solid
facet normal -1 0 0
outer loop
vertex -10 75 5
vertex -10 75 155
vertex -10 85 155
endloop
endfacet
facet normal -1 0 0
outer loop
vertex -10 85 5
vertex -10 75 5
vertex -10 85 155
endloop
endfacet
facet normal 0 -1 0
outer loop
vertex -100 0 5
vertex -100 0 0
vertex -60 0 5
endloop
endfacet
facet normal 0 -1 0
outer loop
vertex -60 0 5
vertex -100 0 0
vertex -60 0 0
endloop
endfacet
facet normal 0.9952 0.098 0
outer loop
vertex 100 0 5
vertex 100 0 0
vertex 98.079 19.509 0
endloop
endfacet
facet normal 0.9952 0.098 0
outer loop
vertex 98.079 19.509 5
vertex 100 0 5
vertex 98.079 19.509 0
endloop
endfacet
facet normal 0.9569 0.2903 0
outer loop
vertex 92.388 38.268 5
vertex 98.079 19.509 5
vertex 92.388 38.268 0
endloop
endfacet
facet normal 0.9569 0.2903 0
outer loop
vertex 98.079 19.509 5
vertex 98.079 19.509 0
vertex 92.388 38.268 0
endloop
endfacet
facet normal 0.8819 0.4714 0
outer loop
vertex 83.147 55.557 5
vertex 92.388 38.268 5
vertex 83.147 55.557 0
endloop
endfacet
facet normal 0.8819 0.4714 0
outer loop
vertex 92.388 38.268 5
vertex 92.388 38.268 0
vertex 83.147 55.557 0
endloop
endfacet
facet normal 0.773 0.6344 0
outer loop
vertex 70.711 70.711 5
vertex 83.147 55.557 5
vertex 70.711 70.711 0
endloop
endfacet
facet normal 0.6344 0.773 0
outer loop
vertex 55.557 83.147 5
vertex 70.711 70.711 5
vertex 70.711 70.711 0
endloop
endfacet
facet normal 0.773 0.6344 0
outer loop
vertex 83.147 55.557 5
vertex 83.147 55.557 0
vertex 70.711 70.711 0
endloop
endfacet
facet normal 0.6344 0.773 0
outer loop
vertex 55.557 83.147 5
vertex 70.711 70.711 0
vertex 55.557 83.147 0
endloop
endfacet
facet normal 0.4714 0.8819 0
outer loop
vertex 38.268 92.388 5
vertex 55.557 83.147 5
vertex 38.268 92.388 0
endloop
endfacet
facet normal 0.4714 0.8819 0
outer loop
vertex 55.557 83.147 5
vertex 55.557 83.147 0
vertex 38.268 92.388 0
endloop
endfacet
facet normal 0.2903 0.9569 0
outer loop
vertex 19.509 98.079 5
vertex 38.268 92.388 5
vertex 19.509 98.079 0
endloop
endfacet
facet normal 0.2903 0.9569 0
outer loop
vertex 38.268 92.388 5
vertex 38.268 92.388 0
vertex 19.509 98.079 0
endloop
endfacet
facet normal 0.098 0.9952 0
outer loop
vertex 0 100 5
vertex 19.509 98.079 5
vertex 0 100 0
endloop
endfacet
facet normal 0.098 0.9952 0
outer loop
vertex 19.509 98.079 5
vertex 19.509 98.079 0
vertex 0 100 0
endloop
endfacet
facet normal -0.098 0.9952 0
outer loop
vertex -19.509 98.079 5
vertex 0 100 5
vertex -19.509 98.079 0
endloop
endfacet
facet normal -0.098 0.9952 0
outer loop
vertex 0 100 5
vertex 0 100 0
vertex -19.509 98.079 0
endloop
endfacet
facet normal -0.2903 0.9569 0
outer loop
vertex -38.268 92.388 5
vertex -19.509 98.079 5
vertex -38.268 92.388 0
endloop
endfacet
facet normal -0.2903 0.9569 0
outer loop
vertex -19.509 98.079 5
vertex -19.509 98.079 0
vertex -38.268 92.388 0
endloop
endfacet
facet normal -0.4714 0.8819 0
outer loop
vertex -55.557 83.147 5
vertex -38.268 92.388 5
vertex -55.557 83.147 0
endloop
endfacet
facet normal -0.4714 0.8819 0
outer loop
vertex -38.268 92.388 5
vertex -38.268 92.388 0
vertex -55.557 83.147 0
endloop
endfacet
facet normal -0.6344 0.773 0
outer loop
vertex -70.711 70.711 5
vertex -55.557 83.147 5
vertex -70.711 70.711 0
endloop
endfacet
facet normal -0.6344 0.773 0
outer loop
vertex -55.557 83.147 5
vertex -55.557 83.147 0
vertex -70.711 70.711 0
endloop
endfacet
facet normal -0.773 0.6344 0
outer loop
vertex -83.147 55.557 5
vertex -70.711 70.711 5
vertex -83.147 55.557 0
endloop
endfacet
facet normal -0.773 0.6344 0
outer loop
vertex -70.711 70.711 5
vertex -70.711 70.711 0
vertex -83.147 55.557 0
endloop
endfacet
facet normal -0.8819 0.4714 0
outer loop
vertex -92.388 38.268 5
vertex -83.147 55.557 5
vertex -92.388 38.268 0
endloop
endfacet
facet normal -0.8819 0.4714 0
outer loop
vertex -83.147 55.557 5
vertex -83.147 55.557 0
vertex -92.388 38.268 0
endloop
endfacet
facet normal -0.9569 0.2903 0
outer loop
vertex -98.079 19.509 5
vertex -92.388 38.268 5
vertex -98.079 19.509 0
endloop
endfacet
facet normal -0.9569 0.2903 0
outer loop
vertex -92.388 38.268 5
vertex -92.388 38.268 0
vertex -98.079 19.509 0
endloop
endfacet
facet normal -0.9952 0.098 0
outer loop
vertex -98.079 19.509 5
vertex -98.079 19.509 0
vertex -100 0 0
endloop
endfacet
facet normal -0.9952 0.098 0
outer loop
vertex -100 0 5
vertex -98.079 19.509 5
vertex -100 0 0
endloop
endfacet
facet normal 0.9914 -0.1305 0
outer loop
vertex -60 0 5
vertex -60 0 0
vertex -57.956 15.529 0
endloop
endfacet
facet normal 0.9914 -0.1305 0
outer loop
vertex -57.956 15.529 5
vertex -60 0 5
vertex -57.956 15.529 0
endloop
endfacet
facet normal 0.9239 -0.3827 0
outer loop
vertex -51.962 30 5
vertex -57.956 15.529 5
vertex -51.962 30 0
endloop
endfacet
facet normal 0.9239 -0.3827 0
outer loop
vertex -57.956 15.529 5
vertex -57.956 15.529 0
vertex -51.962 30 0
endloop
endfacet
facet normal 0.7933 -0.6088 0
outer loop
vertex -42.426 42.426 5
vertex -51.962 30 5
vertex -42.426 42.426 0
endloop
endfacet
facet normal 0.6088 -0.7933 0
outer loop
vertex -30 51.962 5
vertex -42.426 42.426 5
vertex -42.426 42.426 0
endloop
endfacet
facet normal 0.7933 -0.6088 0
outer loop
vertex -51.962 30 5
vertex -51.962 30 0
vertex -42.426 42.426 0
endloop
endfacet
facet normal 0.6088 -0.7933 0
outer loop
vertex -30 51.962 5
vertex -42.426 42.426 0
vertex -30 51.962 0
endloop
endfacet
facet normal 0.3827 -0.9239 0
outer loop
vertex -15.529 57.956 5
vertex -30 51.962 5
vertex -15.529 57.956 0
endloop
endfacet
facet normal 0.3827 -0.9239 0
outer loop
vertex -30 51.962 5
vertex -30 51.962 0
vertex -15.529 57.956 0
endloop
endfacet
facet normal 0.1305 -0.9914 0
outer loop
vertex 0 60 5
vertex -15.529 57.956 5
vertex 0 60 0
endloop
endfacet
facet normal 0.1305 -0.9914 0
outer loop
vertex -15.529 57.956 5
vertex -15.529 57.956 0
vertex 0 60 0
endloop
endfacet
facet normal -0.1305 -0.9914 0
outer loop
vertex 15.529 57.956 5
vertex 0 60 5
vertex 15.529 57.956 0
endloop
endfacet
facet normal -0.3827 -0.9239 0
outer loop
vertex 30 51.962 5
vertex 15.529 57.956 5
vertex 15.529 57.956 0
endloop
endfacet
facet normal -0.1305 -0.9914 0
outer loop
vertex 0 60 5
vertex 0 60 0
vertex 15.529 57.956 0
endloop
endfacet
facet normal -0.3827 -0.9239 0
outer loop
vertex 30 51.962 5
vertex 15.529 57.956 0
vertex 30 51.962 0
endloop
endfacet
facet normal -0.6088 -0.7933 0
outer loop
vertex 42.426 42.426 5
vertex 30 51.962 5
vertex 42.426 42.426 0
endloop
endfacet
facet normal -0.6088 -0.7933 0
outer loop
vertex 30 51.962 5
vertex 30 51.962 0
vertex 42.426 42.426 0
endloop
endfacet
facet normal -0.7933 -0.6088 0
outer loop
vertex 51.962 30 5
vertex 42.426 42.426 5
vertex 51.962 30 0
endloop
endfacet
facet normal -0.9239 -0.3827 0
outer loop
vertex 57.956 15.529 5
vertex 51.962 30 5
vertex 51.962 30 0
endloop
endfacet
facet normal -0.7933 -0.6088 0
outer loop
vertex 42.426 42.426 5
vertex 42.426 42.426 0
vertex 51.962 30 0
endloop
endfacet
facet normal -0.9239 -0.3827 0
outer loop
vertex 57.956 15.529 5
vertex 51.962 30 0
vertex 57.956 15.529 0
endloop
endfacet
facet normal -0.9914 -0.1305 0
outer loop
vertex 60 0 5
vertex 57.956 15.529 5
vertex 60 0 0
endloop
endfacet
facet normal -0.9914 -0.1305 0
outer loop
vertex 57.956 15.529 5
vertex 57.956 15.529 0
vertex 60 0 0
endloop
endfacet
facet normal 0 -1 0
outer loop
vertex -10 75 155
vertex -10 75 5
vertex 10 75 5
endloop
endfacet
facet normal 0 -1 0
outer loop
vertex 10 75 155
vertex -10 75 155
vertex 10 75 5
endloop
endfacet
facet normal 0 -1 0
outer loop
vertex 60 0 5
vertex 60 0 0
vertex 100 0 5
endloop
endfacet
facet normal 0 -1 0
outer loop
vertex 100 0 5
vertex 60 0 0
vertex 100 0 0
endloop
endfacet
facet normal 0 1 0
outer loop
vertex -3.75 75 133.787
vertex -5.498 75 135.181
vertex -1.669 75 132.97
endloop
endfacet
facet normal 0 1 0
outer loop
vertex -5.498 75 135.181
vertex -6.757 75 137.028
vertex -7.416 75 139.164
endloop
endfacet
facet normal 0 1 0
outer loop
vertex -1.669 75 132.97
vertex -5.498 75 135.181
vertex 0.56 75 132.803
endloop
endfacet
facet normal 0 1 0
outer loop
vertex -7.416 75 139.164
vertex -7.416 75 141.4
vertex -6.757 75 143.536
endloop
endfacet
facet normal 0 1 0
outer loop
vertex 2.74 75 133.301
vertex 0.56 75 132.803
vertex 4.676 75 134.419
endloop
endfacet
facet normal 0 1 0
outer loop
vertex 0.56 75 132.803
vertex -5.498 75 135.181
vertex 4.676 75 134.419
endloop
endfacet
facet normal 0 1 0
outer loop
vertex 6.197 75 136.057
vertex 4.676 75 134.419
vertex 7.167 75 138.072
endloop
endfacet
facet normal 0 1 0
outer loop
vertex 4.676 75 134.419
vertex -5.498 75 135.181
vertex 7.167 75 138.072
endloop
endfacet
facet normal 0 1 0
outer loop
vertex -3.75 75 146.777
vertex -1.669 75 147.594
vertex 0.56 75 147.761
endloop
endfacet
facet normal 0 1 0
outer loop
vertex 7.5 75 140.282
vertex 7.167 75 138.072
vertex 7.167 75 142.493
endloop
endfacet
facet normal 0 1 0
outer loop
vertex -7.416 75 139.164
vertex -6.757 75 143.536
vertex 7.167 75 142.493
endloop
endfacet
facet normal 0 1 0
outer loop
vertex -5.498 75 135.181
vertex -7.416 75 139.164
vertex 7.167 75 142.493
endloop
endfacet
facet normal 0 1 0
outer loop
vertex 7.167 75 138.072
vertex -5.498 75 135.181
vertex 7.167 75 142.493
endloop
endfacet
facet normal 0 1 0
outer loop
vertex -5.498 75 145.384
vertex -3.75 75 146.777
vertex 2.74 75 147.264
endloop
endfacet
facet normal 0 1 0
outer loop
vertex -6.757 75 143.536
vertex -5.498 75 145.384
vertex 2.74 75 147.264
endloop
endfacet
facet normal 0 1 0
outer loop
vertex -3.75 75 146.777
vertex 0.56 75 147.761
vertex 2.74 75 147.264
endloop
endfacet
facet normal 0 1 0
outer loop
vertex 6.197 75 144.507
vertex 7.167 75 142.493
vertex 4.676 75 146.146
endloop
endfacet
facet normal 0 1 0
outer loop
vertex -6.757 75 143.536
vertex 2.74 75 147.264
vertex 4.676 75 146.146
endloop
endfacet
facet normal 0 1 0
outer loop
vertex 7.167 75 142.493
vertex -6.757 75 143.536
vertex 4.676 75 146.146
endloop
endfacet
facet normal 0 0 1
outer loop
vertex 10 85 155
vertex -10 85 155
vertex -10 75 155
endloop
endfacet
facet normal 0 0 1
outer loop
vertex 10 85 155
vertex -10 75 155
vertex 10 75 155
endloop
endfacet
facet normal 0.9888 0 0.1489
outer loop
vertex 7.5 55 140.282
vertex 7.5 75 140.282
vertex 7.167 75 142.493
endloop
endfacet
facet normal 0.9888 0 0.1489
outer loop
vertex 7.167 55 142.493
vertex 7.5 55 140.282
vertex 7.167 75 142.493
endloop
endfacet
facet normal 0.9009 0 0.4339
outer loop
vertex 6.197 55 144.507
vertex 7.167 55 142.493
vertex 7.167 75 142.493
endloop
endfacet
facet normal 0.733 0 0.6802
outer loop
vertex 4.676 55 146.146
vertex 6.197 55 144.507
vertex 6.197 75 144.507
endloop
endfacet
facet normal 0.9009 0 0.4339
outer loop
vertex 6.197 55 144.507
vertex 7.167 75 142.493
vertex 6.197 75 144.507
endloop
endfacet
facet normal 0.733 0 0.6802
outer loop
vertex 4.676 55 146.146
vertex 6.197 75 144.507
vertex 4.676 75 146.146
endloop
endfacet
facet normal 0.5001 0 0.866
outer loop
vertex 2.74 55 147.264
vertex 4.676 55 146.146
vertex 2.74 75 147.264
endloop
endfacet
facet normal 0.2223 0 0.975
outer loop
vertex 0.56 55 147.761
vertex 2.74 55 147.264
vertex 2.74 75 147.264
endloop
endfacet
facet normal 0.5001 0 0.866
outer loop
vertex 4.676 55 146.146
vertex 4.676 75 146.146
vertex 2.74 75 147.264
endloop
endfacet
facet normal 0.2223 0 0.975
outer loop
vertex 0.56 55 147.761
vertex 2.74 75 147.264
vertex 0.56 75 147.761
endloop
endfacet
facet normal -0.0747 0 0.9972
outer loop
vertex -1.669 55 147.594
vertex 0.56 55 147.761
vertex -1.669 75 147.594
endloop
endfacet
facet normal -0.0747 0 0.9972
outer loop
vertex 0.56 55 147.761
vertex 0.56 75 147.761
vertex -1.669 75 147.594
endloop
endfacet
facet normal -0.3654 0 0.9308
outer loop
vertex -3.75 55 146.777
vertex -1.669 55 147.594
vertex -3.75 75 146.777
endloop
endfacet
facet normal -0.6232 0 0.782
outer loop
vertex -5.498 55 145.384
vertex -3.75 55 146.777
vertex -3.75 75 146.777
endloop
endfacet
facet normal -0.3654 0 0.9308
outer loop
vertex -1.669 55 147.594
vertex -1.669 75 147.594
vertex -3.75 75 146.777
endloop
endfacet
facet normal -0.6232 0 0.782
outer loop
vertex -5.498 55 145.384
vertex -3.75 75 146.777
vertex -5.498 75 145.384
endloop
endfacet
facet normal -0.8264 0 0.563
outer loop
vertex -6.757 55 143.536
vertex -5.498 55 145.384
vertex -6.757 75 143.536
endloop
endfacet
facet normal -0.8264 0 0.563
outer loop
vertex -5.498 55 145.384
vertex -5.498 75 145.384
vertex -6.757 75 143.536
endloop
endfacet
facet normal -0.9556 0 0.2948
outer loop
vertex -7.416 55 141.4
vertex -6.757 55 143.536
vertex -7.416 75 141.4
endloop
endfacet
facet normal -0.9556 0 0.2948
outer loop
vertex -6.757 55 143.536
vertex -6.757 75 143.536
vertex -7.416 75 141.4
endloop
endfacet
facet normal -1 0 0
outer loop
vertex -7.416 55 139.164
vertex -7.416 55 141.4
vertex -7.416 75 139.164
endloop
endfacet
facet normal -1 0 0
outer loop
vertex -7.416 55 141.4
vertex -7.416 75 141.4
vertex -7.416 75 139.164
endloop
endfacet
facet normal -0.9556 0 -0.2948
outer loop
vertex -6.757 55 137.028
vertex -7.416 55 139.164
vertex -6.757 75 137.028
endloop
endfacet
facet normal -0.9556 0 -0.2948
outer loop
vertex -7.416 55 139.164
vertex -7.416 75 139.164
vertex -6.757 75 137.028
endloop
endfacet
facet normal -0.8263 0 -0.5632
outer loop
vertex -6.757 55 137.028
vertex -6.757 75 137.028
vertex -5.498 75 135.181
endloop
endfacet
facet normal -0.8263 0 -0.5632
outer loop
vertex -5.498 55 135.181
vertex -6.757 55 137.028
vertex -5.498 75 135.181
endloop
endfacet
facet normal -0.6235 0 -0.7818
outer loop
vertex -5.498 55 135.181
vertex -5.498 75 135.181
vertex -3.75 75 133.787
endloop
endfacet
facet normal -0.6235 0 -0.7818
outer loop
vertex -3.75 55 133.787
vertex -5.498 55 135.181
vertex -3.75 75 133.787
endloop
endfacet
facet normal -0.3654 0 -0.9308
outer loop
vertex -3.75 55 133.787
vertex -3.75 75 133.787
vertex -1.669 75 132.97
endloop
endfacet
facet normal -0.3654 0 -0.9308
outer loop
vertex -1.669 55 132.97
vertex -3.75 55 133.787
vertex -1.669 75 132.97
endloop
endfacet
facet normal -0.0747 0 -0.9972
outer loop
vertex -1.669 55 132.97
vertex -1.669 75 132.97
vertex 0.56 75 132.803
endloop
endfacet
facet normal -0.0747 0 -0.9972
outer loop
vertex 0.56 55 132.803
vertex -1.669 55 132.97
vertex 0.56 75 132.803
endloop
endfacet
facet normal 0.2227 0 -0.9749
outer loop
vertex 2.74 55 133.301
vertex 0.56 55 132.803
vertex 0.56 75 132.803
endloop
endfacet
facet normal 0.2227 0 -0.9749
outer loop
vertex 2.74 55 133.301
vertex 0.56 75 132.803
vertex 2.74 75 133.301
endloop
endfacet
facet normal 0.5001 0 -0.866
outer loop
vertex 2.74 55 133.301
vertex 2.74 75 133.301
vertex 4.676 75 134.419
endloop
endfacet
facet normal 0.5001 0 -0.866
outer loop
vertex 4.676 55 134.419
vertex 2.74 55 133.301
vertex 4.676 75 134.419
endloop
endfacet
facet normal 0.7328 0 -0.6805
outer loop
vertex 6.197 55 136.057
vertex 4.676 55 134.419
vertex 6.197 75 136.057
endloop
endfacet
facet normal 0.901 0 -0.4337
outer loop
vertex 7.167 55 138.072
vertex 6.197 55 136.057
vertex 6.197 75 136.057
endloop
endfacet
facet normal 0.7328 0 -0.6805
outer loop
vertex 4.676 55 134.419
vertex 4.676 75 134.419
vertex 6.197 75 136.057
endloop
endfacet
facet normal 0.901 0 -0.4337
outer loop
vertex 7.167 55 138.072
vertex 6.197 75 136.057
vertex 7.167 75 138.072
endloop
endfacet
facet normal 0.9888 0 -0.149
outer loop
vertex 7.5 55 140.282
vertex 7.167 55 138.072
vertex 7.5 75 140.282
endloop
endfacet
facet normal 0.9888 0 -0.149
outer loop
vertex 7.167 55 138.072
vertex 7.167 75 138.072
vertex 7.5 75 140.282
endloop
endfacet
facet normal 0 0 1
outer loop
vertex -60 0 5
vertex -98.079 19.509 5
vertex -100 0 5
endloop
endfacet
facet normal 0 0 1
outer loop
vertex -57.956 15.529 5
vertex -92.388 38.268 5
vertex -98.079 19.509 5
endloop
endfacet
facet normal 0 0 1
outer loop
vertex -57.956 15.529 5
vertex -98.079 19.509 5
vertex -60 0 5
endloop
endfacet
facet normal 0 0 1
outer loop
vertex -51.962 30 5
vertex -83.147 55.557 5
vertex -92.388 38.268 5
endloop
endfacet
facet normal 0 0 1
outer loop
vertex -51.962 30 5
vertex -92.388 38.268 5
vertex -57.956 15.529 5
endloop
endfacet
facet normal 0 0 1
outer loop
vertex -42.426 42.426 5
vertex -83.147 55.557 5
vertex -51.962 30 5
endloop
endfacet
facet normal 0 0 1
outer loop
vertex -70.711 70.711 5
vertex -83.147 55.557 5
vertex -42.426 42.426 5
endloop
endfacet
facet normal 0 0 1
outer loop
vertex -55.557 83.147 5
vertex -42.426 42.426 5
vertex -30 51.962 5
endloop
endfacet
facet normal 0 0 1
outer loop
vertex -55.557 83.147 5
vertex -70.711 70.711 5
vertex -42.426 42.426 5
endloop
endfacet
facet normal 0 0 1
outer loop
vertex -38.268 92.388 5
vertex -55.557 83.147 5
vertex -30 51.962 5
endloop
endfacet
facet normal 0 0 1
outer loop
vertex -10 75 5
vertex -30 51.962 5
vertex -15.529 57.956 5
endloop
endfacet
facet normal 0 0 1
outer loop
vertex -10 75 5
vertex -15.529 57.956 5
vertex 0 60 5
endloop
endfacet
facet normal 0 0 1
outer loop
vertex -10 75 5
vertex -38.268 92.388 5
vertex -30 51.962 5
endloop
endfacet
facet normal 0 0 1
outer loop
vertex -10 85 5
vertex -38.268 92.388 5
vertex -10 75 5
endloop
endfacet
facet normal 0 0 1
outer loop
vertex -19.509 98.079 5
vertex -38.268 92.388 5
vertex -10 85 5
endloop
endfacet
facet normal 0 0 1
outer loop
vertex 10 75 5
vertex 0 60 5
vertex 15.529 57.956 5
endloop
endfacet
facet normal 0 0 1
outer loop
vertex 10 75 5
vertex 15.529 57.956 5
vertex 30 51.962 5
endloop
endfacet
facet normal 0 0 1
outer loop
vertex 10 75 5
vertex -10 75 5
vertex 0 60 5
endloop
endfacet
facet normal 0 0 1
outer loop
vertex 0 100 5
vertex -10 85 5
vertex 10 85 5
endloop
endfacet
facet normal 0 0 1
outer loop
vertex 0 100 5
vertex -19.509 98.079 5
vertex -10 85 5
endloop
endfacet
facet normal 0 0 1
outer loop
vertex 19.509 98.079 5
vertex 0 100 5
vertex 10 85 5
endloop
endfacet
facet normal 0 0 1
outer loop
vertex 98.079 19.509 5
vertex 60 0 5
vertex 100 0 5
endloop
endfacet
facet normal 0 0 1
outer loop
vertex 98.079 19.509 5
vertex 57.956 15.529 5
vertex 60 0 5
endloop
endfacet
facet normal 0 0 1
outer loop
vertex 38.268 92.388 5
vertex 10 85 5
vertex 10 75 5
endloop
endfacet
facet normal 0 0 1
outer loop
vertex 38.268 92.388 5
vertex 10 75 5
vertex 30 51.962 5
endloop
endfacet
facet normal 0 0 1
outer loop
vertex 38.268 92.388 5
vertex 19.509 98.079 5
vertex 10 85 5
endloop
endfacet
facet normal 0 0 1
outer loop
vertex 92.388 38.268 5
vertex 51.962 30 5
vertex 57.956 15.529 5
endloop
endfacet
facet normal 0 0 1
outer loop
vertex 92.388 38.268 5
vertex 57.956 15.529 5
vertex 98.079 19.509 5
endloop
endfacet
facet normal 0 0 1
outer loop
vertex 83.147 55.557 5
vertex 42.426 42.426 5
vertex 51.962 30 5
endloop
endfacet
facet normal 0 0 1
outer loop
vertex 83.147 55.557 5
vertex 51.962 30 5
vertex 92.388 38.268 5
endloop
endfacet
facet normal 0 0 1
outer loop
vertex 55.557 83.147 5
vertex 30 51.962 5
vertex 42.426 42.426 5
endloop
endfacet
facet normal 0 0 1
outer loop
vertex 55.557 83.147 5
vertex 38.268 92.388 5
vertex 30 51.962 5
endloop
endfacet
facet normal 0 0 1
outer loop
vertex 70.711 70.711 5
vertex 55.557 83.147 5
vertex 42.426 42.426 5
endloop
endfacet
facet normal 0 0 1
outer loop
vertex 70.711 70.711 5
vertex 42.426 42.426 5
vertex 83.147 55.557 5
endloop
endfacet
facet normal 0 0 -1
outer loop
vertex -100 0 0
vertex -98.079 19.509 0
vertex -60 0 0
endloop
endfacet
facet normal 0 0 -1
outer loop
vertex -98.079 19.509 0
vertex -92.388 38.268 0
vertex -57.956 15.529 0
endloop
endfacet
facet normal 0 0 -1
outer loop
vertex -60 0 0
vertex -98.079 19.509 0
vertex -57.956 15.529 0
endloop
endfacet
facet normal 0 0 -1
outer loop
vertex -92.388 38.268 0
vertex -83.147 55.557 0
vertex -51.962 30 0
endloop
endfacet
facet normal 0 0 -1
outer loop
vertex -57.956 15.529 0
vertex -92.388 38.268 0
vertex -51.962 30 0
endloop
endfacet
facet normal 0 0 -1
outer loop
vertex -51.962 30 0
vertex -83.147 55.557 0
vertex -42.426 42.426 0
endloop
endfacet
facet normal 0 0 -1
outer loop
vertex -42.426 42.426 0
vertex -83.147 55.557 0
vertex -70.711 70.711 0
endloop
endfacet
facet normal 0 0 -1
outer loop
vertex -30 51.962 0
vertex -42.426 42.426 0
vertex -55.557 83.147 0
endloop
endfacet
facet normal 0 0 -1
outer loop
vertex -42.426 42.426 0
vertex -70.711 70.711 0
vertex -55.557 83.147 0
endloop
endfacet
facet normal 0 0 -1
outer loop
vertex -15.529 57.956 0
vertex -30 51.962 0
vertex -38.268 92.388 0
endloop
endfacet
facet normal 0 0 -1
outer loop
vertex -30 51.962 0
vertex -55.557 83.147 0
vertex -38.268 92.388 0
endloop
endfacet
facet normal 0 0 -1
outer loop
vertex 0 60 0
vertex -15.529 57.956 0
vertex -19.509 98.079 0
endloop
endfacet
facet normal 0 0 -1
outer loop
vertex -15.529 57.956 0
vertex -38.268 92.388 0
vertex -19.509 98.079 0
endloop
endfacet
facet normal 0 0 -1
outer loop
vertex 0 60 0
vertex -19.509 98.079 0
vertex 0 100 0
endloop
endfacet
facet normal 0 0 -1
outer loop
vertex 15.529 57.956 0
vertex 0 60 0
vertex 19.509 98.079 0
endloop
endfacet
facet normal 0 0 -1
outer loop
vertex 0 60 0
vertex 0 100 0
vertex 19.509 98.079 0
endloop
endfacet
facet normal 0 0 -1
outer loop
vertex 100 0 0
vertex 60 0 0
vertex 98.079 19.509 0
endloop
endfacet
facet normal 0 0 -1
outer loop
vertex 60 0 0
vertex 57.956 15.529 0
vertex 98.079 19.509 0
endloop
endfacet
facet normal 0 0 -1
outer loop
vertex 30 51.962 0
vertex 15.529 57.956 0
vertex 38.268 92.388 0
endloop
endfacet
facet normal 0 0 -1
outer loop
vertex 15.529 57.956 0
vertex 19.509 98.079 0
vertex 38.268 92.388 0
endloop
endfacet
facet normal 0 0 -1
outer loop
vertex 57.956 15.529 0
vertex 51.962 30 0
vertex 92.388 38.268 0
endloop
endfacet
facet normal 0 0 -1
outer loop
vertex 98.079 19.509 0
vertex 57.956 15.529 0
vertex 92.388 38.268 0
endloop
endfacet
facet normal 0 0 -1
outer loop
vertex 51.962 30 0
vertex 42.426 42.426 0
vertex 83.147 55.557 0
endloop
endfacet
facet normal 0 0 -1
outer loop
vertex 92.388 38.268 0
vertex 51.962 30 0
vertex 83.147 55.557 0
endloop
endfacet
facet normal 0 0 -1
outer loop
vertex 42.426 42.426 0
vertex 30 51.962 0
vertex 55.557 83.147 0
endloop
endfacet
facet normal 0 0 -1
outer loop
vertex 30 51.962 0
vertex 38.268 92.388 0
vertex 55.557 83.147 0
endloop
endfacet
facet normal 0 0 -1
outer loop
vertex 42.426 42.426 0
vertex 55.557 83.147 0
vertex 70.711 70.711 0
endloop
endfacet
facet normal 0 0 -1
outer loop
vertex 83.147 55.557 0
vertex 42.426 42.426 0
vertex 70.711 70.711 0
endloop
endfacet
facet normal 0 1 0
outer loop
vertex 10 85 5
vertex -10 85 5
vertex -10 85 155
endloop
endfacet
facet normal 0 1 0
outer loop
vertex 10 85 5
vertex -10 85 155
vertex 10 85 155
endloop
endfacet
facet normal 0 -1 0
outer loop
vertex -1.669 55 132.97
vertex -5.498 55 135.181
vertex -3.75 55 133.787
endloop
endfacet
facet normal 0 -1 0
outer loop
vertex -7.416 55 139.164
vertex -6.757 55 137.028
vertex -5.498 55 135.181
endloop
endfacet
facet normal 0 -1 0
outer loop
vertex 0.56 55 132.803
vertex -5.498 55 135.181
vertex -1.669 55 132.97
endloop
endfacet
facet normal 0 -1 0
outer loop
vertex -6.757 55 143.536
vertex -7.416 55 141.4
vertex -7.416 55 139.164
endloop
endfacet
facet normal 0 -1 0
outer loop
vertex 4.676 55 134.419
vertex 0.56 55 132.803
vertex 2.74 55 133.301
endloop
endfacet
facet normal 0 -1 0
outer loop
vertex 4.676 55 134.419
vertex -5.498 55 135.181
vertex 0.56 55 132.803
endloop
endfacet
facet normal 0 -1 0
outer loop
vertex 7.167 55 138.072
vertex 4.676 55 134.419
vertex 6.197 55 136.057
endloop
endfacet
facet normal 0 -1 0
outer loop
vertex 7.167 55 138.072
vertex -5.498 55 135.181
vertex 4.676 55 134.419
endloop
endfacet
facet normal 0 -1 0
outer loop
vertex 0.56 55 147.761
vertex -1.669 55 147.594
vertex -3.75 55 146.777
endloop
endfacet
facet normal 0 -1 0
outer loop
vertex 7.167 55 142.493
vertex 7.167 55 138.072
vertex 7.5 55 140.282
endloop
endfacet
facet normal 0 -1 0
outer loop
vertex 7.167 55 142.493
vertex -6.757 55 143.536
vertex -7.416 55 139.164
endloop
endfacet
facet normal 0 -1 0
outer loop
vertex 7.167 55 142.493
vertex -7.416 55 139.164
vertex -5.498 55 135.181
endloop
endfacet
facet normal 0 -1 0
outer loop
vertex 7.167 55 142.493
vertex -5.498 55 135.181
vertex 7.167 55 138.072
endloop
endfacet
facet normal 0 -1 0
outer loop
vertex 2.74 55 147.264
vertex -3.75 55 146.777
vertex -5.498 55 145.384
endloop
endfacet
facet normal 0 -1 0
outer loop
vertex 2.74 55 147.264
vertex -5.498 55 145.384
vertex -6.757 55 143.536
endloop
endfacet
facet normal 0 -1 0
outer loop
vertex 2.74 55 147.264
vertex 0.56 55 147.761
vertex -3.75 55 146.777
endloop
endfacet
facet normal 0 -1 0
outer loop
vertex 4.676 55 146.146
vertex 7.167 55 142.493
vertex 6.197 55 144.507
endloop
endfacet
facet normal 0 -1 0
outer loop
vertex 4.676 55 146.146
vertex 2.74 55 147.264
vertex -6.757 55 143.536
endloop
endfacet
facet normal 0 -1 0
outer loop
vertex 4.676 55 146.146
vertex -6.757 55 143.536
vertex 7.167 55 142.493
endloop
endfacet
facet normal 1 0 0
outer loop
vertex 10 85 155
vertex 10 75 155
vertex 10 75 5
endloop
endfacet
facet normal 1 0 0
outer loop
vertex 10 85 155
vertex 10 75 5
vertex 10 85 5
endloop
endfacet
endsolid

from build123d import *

# Parameters (mm, degrees)
F1_DEPTH = 5
F2_W     = 20
F2_H     = 10
F3_DEPTH = 150
F4_R     = 7.5
F5_DEPTH = 20


with BuildPart() as f1:
    # F0 (on Top) → F1 (new body)
    with BuildSketch(Plane.XY):
        with BuildLine():
            Line((60, 0), (100, 0))
            ThreePointArc((100, 0), (0, 100), (-100, 0))
            Line((-100, 0), (-60, 0))
            ThreePointArc((-60, 0), (0, 60), (60, 0))
        make_face()
    extrude(amount=F1_DEPTH)

    # F2 (on face) → F3 (join)
    with BuildSketch(Plane.XY.offset(5)):
        with Locations((0, 80)):
            Rectangle(F2_W, F2_H)
    extrude(amount=F3_DEPTH)


with BuildPart() as f5:
    # F4 (on face) → F5 (new body)
    with BuildSketch(Plane.XZ.offset(-75)):
        with Locations((0, 140.282258)):
            Circle(F4_R)
    extrude(amount=F5_DEPTH)


solid = Compound([f1.part, f5.part])
